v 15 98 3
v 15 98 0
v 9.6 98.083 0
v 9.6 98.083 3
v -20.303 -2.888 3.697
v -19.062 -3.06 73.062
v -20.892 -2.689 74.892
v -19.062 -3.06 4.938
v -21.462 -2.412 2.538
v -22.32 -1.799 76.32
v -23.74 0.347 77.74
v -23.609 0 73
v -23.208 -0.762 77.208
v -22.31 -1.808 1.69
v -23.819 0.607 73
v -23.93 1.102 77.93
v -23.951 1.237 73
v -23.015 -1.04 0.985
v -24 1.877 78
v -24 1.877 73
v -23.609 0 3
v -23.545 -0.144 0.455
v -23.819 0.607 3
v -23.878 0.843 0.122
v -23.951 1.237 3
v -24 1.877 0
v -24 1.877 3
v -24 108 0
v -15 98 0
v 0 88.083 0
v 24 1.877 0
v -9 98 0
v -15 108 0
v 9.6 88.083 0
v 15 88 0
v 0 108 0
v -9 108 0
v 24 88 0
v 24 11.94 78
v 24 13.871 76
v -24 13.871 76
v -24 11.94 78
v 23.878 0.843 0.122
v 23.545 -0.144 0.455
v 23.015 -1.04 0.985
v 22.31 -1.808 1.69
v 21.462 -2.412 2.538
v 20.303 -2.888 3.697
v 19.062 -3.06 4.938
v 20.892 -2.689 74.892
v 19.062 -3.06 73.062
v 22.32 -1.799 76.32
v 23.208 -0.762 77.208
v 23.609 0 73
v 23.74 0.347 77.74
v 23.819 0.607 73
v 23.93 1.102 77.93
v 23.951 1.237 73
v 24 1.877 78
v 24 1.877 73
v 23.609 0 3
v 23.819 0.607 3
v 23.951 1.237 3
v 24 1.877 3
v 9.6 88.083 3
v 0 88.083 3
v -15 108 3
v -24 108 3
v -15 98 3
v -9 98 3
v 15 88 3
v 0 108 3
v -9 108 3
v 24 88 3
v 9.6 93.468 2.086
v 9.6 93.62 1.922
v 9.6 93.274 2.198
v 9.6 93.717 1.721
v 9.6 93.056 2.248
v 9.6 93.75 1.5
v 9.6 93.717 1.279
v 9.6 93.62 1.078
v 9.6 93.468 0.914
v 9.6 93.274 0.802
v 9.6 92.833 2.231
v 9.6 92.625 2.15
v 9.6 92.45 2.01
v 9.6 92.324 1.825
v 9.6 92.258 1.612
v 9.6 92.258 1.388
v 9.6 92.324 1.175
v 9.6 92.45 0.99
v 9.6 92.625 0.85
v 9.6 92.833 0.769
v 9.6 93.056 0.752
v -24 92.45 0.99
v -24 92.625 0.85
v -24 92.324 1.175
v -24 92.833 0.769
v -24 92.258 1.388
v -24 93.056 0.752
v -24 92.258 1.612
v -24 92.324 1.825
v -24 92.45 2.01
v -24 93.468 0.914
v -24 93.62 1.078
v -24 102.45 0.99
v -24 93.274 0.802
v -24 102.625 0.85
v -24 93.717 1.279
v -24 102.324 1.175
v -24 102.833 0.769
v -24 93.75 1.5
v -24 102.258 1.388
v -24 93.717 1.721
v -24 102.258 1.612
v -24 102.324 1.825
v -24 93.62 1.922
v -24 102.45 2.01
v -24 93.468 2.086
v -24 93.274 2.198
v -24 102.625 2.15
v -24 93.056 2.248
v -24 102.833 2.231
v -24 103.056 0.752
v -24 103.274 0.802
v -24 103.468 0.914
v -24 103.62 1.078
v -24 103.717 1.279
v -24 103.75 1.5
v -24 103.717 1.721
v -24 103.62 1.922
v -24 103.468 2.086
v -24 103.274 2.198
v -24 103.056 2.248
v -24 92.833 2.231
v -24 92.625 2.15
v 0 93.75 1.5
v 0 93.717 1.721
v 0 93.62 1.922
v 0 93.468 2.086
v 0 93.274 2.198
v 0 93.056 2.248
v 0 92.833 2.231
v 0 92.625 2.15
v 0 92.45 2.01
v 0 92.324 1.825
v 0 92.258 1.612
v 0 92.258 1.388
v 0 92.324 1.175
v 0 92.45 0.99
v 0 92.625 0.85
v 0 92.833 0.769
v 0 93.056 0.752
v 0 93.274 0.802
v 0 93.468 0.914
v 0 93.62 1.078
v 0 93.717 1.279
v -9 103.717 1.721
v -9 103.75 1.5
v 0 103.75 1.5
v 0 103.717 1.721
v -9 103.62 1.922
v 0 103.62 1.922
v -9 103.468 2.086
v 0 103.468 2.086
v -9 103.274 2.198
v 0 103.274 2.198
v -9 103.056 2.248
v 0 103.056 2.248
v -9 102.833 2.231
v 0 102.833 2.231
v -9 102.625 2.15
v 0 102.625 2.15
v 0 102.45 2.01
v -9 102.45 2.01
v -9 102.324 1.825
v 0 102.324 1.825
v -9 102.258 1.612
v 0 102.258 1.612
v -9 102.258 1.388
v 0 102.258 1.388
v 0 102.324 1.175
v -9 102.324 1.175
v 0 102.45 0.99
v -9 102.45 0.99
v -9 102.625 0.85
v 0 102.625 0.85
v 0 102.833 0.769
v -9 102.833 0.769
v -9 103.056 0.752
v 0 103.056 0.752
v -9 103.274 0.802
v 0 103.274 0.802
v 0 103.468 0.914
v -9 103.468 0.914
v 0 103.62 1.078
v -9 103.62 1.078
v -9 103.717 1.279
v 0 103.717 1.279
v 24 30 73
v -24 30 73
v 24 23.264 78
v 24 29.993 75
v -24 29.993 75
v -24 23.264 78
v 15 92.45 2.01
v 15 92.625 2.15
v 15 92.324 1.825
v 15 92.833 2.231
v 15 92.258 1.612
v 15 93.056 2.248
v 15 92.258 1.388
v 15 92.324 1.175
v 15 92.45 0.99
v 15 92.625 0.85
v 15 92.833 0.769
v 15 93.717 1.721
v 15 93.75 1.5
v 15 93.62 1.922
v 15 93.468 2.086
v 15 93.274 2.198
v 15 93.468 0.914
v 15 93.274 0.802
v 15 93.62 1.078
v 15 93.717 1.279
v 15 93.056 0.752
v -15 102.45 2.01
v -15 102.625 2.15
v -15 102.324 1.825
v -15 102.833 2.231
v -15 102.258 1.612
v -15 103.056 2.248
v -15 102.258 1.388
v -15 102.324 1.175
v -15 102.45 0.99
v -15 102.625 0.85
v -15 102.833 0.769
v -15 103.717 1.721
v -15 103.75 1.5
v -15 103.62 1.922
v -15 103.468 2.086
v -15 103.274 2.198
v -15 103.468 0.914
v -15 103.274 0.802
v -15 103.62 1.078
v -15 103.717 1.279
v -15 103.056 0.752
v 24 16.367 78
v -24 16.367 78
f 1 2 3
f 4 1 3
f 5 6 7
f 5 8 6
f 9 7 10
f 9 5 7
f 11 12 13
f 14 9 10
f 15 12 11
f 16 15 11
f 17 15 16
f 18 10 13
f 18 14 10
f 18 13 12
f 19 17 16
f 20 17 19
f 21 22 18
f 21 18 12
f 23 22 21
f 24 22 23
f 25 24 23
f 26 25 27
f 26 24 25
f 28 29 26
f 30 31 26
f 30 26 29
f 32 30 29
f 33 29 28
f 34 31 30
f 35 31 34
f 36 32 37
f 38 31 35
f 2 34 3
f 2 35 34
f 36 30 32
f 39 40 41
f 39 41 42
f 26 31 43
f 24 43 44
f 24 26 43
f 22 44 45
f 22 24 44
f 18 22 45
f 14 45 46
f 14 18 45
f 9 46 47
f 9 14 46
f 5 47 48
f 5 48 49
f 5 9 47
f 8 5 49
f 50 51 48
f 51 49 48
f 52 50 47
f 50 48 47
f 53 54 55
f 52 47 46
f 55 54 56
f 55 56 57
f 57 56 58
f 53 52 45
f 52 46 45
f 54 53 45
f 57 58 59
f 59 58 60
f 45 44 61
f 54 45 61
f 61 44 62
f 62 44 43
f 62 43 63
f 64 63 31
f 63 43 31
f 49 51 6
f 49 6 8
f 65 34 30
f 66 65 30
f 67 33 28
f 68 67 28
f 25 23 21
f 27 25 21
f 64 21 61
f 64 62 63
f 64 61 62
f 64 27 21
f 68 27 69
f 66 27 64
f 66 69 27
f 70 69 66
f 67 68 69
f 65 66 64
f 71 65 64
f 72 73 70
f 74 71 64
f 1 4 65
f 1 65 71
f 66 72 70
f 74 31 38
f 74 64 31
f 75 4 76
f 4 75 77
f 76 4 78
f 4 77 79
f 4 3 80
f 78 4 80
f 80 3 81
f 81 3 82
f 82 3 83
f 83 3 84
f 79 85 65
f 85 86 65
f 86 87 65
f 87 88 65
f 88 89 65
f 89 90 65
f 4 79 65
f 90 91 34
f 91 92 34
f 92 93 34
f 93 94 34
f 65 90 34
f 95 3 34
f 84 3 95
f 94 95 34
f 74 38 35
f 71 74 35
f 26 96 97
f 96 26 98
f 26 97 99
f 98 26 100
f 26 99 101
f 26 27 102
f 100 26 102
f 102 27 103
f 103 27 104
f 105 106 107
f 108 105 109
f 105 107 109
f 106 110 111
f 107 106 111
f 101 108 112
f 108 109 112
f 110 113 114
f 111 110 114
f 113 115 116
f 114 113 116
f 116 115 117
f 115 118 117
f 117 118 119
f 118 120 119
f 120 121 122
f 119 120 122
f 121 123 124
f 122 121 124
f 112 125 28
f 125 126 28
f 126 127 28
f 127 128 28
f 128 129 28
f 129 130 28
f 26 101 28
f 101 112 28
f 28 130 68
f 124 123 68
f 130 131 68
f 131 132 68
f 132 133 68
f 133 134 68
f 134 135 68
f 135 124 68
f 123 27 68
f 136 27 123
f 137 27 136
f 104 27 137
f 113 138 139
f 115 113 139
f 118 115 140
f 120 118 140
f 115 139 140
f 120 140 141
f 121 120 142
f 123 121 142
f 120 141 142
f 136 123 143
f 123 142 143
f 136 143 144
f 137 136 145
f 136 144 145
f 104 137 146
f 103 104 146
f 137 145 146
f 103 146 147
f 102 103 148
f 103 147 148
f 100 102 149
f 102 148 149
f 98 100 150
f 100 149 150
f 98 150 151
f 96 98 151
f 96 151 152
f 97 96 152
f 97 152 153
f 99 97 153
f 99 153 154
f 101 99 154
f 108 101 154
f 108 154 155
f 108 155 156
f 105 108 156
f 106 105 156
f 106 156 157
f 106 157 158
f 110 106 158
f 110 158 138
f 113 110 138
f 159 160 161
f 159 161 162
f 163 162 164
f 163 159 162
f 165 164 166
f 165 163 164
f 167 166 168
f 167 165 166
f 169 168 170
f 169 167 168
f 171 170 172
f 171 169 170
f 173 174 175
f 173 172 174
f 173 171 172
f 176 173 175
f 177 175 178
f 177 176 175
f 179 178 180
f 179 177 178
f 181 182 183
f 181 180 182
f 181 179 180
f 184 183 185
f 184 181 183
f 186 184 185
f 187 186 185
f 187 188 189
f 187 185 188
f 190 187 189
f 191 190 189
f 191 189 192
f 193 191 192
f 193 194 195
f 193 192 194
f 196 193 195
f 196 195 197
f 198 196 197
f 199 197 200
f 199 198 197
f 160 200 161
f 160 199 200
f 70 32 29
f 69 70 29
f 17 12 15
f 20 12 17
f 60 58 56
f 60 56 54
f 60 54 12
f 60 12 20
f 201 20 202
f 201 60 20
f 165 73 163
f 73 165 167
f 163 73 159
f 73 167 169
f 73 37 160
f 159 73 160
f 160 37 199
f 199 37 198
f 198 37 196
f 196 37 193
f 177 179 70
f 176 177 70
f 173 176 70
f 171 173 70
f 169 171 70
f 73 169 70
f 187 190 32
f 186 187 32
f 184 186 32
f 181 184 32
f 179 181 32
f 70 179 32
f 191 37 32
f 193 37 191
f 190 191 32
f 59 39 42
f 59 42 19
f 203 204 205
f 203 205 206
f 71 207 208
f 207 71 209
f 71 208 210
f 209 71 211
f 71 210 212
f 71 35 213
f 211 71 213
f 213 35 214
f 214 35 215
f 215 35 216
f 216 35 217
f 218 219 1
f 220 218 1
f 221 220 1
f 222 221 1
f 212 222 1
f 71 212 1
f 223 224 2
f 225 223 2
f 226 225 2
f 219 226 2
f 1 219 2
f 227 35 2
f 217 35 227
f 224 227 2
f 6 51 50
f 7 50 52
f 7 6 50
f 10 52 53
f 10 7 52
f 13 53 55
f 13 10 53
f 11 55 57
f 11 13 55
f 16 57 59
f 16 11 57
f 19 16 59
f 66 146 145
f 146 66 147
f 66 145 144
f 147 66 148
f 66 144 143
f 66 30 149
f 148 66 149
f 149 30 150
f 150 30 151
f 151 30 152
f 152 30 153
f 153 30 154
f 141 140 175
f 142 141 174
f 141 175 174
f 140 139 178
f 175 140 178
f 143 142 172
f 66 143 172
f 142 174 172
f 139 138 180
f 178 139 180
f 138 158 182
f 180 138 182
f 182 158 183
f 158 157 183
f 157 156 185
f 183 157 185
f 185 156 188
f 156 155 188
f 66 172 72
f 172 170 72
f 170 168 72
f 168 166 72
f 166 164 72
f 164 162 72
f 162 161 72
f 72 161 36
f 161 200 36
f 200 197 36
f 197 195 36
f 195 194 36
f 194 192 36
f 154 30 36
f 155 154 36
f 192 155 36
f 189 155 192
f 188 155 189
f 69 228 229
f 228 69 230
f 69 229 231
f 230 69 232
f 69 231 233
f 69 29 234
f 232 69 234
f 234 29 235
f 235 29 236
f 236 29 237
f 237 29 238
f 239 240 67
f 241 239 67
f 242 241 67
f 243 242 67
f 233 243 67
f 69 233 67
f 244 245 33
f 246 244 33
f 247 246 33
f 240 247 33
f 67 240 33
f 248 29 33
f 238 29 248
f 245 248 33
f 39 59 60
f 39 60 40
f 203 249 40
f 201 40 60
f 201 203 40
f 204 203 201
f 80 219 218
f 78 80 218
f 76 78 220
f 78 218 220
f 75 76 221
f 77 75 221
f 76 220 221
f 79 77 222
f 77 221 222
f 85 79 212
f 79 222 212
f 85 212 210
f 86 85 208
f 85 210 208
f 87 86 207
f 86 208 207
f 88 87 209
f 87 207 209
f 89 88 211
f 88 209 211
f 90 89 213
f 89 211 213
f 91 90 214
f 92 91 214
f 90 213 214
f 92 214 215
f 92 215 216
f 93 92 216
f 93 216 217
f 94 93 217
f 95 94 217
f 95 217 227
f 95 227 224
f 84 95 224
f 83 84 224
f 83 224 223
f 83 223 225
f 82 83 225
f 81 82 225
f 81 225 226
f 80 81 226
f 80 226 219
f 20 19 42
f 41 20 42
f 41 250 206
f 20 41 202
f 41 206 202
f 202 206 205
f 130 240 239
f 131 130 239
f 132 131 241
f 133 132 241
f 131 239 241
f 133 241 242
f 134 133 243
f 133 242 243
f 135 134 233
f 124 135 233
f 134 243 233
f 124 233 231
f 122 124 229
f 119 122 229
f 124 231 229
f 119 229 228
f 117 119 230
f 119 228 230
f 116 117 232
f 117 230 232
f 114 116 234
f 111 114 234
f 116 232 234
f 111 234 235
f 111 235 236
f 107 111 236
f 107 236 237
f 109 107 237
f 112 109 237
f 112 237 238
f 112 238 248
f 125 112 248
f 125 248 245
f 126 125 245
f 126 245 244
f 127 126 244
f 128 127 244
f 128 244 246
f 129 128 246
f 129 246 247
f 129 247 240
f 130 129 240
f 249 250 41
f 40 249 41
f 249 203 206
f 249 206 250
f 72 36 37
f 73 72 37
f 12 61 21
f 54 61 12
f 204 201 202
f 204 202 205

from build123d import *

# Parameters (mm, degrees)
F1_DEPTH      = 3
F3_DEPTH      = 48
F4_T1_DEPTH   = 73.0048285071
F4_T3_DEPTH   = 103.0048285071
F5_R          = 0.75
F6_DEPTH      = 39.001
F7_R          = 0.75
F8_DEPTH      = 9.001
F8_DEPTH_BACK = 39.001


# Not quite as in the source:
# - a fillet or chamfer that OpenCascade refuses, or shapes differently, is made with other operations: its cross-section is extruded or revolved along the edge and cut away or added


with BuildPart() as f1:
    # F0 (on Top) → F1 (new body)
    with BuildSketch(Plane.XY):
        Polygon((-24, 0), (0, 0), (24, 0), (24, 88), (15, 88), (15, 98), (9.6, 98.0832448602), (9.6, 88.0832448602), (0, 88.0832448602), (0, 108), (-9, 108), (-9, 98), (-15, 98), (-15, 108), (-24, 108), align=None)
    extrude(amount=F1_DEPTH)

    # F2 (on face) → F3 (join)
    with BuildSketch(Plane.YZ.offset(24)):
        Polygon((-3.0602848184, 0), (0, 0), (0, 73), (30, 73), (29.9925141591, 74.9999859905), (23.2637450099, 78), (16.367437318, 78), (13.8705000281, 76), (11.9397151816, 78), (-3.0602848184, 78), align=None)
    extrude(amount=-F3_DEPTH)

    # F4: fillet of radius 5 on 6 edges, made by hand

    # F4_s2 → F4_t1 (cut)
    with BuildSketch(Plane.YZ.offset(-36.5024142536)):
        with BuildLine():
            ThreePointArc((-3.0606848184, 72.9990343146), (-1.5958187243, 76.5355339059), (1.9406808671, 78.0004))
            Line((1.9406808671, 78.0004), (1.9406808671, 78.5005365685))
            ThreePointArc((1.9406808671, 78.5005365685), (-0.5598019756, 78.5001365685), (-3.0602848184, 78.5001365685))
            Line((-3.0602848184, 78.5001365685), (-3.5604213869, 78))
            ThreePointArc((-3.5604213869, 78), (-3.5604213869, 75.4995171573), (-3.5608213869, 72.9990343146))
            Line((-3.5608213869, 72.9990343146), (-3.0606848184, 72.9990343146))
        make_face()
        with BuildLine():
            ThreePointArc((1.9406808671, -0.0004), (-1.5958187243, 1.4644660941), (-3.0606848184, 5.0009656854))
            Line((-3.0606848184, 5.0009656854), (-3.5608213869, 5.0009656854))
            ThreePointArc((-3.5608213869, 5.0009656854), (-3.5604213869, 2.5004828427), (-3.5604213869, 0))
            Line((-3.5604213869, 0), (-3.0602848184, -0.5001365685))
            ThreePointArc((-3.0602848184, -0.5001365685), (-0.5598019756, -0.5001365685), (1.9406808671, -0.5005365685))
            Line((1.9406808671, -0.5005365685), (1.9406808671, -0.0004))
        make_face()
    extrude(amount=F4_T1_DEPTH, mode=Mode.SUBTRACT)

    # F4_s4 → F4_t3 (cut)
    with BuildSketch(Plane.XY.offset(-12.5024142536)):
        with BuildLine():
            ThreePointArc((18.9990343146, -3.0606848184), (22.5355339059, -1.5958187243), (24.0004, 1.9406808671))
            Line((24.0004, 1.9406808671), (24.5005365685, 1.9406808671))
            ThreePointArc((24.5005365685, 1.9406808671), (24.5001365685, -0.5598019756), (24.5001365685, -3.0602848184))
            Line((24.5001365685, -3.0602848184), (24, -3.5604213869))
            ThreePointArc((24, -3.5604213869), (21.4995171573, -3.5604213869), (18.9990343146, -3.5608213869))
            Line((18.9990343146, -3.5608213869), (18.9990343146, -3.0606848184))
        make_face()
        with BuildLine():
            ThreePointArc((-18.9990343146, -3.0606848184), (-22.5355339059, -1.5958187243), (-24.0004, 1.9406808671))
            Line((-24.0004, 1.9406808671), (-24.5005365685, 1.9406808671))
            ThreePointArc((-24.5005365685, 1.9406808671), (-24.5001365685, -0.5598019756), (-24.5001365685, -3.0602848184))
            Line((-24.5001365685, -3.0602848184), (-24, -3.5604213869))
            ThreePointArc((-24, -3.5604213869), (-21.4995171573, -3.5604213869), (-18.9990343146, -3.5608213869))
            Line((-18.9990343146, -3.5608213869), (-18.9990343146, -3.0606848184))
        make_face()
    extrude(amount=F4_T3_DEPTH, mode=Mode.SUBTRACT)

    # F5 (on face) → F6 (cut, through all)
    with BuildSketch(Plane.YZ.offset(15)):
        with Locations((93, 1.5)):
            Circle(F5_R)
    extrude(amount=-F6_DEPTH, mode=Mode.SUBTRACT)

    # F7 (on face) → F8 (cut, two sides)
    with BuildSketch(Plane.YZ.offset(-15)) as f8_sk:
        with Locations((103, 1.5)):
            Circle(F7_R)
    extrude(amount=-F8_DEPTH, mode=Mode.SUBTRACT)
    extrude(f8_sk.sketch, amount=F8_DEPTH_BACK, mode=Mode.SUBTRACT)


solid = f1.part
